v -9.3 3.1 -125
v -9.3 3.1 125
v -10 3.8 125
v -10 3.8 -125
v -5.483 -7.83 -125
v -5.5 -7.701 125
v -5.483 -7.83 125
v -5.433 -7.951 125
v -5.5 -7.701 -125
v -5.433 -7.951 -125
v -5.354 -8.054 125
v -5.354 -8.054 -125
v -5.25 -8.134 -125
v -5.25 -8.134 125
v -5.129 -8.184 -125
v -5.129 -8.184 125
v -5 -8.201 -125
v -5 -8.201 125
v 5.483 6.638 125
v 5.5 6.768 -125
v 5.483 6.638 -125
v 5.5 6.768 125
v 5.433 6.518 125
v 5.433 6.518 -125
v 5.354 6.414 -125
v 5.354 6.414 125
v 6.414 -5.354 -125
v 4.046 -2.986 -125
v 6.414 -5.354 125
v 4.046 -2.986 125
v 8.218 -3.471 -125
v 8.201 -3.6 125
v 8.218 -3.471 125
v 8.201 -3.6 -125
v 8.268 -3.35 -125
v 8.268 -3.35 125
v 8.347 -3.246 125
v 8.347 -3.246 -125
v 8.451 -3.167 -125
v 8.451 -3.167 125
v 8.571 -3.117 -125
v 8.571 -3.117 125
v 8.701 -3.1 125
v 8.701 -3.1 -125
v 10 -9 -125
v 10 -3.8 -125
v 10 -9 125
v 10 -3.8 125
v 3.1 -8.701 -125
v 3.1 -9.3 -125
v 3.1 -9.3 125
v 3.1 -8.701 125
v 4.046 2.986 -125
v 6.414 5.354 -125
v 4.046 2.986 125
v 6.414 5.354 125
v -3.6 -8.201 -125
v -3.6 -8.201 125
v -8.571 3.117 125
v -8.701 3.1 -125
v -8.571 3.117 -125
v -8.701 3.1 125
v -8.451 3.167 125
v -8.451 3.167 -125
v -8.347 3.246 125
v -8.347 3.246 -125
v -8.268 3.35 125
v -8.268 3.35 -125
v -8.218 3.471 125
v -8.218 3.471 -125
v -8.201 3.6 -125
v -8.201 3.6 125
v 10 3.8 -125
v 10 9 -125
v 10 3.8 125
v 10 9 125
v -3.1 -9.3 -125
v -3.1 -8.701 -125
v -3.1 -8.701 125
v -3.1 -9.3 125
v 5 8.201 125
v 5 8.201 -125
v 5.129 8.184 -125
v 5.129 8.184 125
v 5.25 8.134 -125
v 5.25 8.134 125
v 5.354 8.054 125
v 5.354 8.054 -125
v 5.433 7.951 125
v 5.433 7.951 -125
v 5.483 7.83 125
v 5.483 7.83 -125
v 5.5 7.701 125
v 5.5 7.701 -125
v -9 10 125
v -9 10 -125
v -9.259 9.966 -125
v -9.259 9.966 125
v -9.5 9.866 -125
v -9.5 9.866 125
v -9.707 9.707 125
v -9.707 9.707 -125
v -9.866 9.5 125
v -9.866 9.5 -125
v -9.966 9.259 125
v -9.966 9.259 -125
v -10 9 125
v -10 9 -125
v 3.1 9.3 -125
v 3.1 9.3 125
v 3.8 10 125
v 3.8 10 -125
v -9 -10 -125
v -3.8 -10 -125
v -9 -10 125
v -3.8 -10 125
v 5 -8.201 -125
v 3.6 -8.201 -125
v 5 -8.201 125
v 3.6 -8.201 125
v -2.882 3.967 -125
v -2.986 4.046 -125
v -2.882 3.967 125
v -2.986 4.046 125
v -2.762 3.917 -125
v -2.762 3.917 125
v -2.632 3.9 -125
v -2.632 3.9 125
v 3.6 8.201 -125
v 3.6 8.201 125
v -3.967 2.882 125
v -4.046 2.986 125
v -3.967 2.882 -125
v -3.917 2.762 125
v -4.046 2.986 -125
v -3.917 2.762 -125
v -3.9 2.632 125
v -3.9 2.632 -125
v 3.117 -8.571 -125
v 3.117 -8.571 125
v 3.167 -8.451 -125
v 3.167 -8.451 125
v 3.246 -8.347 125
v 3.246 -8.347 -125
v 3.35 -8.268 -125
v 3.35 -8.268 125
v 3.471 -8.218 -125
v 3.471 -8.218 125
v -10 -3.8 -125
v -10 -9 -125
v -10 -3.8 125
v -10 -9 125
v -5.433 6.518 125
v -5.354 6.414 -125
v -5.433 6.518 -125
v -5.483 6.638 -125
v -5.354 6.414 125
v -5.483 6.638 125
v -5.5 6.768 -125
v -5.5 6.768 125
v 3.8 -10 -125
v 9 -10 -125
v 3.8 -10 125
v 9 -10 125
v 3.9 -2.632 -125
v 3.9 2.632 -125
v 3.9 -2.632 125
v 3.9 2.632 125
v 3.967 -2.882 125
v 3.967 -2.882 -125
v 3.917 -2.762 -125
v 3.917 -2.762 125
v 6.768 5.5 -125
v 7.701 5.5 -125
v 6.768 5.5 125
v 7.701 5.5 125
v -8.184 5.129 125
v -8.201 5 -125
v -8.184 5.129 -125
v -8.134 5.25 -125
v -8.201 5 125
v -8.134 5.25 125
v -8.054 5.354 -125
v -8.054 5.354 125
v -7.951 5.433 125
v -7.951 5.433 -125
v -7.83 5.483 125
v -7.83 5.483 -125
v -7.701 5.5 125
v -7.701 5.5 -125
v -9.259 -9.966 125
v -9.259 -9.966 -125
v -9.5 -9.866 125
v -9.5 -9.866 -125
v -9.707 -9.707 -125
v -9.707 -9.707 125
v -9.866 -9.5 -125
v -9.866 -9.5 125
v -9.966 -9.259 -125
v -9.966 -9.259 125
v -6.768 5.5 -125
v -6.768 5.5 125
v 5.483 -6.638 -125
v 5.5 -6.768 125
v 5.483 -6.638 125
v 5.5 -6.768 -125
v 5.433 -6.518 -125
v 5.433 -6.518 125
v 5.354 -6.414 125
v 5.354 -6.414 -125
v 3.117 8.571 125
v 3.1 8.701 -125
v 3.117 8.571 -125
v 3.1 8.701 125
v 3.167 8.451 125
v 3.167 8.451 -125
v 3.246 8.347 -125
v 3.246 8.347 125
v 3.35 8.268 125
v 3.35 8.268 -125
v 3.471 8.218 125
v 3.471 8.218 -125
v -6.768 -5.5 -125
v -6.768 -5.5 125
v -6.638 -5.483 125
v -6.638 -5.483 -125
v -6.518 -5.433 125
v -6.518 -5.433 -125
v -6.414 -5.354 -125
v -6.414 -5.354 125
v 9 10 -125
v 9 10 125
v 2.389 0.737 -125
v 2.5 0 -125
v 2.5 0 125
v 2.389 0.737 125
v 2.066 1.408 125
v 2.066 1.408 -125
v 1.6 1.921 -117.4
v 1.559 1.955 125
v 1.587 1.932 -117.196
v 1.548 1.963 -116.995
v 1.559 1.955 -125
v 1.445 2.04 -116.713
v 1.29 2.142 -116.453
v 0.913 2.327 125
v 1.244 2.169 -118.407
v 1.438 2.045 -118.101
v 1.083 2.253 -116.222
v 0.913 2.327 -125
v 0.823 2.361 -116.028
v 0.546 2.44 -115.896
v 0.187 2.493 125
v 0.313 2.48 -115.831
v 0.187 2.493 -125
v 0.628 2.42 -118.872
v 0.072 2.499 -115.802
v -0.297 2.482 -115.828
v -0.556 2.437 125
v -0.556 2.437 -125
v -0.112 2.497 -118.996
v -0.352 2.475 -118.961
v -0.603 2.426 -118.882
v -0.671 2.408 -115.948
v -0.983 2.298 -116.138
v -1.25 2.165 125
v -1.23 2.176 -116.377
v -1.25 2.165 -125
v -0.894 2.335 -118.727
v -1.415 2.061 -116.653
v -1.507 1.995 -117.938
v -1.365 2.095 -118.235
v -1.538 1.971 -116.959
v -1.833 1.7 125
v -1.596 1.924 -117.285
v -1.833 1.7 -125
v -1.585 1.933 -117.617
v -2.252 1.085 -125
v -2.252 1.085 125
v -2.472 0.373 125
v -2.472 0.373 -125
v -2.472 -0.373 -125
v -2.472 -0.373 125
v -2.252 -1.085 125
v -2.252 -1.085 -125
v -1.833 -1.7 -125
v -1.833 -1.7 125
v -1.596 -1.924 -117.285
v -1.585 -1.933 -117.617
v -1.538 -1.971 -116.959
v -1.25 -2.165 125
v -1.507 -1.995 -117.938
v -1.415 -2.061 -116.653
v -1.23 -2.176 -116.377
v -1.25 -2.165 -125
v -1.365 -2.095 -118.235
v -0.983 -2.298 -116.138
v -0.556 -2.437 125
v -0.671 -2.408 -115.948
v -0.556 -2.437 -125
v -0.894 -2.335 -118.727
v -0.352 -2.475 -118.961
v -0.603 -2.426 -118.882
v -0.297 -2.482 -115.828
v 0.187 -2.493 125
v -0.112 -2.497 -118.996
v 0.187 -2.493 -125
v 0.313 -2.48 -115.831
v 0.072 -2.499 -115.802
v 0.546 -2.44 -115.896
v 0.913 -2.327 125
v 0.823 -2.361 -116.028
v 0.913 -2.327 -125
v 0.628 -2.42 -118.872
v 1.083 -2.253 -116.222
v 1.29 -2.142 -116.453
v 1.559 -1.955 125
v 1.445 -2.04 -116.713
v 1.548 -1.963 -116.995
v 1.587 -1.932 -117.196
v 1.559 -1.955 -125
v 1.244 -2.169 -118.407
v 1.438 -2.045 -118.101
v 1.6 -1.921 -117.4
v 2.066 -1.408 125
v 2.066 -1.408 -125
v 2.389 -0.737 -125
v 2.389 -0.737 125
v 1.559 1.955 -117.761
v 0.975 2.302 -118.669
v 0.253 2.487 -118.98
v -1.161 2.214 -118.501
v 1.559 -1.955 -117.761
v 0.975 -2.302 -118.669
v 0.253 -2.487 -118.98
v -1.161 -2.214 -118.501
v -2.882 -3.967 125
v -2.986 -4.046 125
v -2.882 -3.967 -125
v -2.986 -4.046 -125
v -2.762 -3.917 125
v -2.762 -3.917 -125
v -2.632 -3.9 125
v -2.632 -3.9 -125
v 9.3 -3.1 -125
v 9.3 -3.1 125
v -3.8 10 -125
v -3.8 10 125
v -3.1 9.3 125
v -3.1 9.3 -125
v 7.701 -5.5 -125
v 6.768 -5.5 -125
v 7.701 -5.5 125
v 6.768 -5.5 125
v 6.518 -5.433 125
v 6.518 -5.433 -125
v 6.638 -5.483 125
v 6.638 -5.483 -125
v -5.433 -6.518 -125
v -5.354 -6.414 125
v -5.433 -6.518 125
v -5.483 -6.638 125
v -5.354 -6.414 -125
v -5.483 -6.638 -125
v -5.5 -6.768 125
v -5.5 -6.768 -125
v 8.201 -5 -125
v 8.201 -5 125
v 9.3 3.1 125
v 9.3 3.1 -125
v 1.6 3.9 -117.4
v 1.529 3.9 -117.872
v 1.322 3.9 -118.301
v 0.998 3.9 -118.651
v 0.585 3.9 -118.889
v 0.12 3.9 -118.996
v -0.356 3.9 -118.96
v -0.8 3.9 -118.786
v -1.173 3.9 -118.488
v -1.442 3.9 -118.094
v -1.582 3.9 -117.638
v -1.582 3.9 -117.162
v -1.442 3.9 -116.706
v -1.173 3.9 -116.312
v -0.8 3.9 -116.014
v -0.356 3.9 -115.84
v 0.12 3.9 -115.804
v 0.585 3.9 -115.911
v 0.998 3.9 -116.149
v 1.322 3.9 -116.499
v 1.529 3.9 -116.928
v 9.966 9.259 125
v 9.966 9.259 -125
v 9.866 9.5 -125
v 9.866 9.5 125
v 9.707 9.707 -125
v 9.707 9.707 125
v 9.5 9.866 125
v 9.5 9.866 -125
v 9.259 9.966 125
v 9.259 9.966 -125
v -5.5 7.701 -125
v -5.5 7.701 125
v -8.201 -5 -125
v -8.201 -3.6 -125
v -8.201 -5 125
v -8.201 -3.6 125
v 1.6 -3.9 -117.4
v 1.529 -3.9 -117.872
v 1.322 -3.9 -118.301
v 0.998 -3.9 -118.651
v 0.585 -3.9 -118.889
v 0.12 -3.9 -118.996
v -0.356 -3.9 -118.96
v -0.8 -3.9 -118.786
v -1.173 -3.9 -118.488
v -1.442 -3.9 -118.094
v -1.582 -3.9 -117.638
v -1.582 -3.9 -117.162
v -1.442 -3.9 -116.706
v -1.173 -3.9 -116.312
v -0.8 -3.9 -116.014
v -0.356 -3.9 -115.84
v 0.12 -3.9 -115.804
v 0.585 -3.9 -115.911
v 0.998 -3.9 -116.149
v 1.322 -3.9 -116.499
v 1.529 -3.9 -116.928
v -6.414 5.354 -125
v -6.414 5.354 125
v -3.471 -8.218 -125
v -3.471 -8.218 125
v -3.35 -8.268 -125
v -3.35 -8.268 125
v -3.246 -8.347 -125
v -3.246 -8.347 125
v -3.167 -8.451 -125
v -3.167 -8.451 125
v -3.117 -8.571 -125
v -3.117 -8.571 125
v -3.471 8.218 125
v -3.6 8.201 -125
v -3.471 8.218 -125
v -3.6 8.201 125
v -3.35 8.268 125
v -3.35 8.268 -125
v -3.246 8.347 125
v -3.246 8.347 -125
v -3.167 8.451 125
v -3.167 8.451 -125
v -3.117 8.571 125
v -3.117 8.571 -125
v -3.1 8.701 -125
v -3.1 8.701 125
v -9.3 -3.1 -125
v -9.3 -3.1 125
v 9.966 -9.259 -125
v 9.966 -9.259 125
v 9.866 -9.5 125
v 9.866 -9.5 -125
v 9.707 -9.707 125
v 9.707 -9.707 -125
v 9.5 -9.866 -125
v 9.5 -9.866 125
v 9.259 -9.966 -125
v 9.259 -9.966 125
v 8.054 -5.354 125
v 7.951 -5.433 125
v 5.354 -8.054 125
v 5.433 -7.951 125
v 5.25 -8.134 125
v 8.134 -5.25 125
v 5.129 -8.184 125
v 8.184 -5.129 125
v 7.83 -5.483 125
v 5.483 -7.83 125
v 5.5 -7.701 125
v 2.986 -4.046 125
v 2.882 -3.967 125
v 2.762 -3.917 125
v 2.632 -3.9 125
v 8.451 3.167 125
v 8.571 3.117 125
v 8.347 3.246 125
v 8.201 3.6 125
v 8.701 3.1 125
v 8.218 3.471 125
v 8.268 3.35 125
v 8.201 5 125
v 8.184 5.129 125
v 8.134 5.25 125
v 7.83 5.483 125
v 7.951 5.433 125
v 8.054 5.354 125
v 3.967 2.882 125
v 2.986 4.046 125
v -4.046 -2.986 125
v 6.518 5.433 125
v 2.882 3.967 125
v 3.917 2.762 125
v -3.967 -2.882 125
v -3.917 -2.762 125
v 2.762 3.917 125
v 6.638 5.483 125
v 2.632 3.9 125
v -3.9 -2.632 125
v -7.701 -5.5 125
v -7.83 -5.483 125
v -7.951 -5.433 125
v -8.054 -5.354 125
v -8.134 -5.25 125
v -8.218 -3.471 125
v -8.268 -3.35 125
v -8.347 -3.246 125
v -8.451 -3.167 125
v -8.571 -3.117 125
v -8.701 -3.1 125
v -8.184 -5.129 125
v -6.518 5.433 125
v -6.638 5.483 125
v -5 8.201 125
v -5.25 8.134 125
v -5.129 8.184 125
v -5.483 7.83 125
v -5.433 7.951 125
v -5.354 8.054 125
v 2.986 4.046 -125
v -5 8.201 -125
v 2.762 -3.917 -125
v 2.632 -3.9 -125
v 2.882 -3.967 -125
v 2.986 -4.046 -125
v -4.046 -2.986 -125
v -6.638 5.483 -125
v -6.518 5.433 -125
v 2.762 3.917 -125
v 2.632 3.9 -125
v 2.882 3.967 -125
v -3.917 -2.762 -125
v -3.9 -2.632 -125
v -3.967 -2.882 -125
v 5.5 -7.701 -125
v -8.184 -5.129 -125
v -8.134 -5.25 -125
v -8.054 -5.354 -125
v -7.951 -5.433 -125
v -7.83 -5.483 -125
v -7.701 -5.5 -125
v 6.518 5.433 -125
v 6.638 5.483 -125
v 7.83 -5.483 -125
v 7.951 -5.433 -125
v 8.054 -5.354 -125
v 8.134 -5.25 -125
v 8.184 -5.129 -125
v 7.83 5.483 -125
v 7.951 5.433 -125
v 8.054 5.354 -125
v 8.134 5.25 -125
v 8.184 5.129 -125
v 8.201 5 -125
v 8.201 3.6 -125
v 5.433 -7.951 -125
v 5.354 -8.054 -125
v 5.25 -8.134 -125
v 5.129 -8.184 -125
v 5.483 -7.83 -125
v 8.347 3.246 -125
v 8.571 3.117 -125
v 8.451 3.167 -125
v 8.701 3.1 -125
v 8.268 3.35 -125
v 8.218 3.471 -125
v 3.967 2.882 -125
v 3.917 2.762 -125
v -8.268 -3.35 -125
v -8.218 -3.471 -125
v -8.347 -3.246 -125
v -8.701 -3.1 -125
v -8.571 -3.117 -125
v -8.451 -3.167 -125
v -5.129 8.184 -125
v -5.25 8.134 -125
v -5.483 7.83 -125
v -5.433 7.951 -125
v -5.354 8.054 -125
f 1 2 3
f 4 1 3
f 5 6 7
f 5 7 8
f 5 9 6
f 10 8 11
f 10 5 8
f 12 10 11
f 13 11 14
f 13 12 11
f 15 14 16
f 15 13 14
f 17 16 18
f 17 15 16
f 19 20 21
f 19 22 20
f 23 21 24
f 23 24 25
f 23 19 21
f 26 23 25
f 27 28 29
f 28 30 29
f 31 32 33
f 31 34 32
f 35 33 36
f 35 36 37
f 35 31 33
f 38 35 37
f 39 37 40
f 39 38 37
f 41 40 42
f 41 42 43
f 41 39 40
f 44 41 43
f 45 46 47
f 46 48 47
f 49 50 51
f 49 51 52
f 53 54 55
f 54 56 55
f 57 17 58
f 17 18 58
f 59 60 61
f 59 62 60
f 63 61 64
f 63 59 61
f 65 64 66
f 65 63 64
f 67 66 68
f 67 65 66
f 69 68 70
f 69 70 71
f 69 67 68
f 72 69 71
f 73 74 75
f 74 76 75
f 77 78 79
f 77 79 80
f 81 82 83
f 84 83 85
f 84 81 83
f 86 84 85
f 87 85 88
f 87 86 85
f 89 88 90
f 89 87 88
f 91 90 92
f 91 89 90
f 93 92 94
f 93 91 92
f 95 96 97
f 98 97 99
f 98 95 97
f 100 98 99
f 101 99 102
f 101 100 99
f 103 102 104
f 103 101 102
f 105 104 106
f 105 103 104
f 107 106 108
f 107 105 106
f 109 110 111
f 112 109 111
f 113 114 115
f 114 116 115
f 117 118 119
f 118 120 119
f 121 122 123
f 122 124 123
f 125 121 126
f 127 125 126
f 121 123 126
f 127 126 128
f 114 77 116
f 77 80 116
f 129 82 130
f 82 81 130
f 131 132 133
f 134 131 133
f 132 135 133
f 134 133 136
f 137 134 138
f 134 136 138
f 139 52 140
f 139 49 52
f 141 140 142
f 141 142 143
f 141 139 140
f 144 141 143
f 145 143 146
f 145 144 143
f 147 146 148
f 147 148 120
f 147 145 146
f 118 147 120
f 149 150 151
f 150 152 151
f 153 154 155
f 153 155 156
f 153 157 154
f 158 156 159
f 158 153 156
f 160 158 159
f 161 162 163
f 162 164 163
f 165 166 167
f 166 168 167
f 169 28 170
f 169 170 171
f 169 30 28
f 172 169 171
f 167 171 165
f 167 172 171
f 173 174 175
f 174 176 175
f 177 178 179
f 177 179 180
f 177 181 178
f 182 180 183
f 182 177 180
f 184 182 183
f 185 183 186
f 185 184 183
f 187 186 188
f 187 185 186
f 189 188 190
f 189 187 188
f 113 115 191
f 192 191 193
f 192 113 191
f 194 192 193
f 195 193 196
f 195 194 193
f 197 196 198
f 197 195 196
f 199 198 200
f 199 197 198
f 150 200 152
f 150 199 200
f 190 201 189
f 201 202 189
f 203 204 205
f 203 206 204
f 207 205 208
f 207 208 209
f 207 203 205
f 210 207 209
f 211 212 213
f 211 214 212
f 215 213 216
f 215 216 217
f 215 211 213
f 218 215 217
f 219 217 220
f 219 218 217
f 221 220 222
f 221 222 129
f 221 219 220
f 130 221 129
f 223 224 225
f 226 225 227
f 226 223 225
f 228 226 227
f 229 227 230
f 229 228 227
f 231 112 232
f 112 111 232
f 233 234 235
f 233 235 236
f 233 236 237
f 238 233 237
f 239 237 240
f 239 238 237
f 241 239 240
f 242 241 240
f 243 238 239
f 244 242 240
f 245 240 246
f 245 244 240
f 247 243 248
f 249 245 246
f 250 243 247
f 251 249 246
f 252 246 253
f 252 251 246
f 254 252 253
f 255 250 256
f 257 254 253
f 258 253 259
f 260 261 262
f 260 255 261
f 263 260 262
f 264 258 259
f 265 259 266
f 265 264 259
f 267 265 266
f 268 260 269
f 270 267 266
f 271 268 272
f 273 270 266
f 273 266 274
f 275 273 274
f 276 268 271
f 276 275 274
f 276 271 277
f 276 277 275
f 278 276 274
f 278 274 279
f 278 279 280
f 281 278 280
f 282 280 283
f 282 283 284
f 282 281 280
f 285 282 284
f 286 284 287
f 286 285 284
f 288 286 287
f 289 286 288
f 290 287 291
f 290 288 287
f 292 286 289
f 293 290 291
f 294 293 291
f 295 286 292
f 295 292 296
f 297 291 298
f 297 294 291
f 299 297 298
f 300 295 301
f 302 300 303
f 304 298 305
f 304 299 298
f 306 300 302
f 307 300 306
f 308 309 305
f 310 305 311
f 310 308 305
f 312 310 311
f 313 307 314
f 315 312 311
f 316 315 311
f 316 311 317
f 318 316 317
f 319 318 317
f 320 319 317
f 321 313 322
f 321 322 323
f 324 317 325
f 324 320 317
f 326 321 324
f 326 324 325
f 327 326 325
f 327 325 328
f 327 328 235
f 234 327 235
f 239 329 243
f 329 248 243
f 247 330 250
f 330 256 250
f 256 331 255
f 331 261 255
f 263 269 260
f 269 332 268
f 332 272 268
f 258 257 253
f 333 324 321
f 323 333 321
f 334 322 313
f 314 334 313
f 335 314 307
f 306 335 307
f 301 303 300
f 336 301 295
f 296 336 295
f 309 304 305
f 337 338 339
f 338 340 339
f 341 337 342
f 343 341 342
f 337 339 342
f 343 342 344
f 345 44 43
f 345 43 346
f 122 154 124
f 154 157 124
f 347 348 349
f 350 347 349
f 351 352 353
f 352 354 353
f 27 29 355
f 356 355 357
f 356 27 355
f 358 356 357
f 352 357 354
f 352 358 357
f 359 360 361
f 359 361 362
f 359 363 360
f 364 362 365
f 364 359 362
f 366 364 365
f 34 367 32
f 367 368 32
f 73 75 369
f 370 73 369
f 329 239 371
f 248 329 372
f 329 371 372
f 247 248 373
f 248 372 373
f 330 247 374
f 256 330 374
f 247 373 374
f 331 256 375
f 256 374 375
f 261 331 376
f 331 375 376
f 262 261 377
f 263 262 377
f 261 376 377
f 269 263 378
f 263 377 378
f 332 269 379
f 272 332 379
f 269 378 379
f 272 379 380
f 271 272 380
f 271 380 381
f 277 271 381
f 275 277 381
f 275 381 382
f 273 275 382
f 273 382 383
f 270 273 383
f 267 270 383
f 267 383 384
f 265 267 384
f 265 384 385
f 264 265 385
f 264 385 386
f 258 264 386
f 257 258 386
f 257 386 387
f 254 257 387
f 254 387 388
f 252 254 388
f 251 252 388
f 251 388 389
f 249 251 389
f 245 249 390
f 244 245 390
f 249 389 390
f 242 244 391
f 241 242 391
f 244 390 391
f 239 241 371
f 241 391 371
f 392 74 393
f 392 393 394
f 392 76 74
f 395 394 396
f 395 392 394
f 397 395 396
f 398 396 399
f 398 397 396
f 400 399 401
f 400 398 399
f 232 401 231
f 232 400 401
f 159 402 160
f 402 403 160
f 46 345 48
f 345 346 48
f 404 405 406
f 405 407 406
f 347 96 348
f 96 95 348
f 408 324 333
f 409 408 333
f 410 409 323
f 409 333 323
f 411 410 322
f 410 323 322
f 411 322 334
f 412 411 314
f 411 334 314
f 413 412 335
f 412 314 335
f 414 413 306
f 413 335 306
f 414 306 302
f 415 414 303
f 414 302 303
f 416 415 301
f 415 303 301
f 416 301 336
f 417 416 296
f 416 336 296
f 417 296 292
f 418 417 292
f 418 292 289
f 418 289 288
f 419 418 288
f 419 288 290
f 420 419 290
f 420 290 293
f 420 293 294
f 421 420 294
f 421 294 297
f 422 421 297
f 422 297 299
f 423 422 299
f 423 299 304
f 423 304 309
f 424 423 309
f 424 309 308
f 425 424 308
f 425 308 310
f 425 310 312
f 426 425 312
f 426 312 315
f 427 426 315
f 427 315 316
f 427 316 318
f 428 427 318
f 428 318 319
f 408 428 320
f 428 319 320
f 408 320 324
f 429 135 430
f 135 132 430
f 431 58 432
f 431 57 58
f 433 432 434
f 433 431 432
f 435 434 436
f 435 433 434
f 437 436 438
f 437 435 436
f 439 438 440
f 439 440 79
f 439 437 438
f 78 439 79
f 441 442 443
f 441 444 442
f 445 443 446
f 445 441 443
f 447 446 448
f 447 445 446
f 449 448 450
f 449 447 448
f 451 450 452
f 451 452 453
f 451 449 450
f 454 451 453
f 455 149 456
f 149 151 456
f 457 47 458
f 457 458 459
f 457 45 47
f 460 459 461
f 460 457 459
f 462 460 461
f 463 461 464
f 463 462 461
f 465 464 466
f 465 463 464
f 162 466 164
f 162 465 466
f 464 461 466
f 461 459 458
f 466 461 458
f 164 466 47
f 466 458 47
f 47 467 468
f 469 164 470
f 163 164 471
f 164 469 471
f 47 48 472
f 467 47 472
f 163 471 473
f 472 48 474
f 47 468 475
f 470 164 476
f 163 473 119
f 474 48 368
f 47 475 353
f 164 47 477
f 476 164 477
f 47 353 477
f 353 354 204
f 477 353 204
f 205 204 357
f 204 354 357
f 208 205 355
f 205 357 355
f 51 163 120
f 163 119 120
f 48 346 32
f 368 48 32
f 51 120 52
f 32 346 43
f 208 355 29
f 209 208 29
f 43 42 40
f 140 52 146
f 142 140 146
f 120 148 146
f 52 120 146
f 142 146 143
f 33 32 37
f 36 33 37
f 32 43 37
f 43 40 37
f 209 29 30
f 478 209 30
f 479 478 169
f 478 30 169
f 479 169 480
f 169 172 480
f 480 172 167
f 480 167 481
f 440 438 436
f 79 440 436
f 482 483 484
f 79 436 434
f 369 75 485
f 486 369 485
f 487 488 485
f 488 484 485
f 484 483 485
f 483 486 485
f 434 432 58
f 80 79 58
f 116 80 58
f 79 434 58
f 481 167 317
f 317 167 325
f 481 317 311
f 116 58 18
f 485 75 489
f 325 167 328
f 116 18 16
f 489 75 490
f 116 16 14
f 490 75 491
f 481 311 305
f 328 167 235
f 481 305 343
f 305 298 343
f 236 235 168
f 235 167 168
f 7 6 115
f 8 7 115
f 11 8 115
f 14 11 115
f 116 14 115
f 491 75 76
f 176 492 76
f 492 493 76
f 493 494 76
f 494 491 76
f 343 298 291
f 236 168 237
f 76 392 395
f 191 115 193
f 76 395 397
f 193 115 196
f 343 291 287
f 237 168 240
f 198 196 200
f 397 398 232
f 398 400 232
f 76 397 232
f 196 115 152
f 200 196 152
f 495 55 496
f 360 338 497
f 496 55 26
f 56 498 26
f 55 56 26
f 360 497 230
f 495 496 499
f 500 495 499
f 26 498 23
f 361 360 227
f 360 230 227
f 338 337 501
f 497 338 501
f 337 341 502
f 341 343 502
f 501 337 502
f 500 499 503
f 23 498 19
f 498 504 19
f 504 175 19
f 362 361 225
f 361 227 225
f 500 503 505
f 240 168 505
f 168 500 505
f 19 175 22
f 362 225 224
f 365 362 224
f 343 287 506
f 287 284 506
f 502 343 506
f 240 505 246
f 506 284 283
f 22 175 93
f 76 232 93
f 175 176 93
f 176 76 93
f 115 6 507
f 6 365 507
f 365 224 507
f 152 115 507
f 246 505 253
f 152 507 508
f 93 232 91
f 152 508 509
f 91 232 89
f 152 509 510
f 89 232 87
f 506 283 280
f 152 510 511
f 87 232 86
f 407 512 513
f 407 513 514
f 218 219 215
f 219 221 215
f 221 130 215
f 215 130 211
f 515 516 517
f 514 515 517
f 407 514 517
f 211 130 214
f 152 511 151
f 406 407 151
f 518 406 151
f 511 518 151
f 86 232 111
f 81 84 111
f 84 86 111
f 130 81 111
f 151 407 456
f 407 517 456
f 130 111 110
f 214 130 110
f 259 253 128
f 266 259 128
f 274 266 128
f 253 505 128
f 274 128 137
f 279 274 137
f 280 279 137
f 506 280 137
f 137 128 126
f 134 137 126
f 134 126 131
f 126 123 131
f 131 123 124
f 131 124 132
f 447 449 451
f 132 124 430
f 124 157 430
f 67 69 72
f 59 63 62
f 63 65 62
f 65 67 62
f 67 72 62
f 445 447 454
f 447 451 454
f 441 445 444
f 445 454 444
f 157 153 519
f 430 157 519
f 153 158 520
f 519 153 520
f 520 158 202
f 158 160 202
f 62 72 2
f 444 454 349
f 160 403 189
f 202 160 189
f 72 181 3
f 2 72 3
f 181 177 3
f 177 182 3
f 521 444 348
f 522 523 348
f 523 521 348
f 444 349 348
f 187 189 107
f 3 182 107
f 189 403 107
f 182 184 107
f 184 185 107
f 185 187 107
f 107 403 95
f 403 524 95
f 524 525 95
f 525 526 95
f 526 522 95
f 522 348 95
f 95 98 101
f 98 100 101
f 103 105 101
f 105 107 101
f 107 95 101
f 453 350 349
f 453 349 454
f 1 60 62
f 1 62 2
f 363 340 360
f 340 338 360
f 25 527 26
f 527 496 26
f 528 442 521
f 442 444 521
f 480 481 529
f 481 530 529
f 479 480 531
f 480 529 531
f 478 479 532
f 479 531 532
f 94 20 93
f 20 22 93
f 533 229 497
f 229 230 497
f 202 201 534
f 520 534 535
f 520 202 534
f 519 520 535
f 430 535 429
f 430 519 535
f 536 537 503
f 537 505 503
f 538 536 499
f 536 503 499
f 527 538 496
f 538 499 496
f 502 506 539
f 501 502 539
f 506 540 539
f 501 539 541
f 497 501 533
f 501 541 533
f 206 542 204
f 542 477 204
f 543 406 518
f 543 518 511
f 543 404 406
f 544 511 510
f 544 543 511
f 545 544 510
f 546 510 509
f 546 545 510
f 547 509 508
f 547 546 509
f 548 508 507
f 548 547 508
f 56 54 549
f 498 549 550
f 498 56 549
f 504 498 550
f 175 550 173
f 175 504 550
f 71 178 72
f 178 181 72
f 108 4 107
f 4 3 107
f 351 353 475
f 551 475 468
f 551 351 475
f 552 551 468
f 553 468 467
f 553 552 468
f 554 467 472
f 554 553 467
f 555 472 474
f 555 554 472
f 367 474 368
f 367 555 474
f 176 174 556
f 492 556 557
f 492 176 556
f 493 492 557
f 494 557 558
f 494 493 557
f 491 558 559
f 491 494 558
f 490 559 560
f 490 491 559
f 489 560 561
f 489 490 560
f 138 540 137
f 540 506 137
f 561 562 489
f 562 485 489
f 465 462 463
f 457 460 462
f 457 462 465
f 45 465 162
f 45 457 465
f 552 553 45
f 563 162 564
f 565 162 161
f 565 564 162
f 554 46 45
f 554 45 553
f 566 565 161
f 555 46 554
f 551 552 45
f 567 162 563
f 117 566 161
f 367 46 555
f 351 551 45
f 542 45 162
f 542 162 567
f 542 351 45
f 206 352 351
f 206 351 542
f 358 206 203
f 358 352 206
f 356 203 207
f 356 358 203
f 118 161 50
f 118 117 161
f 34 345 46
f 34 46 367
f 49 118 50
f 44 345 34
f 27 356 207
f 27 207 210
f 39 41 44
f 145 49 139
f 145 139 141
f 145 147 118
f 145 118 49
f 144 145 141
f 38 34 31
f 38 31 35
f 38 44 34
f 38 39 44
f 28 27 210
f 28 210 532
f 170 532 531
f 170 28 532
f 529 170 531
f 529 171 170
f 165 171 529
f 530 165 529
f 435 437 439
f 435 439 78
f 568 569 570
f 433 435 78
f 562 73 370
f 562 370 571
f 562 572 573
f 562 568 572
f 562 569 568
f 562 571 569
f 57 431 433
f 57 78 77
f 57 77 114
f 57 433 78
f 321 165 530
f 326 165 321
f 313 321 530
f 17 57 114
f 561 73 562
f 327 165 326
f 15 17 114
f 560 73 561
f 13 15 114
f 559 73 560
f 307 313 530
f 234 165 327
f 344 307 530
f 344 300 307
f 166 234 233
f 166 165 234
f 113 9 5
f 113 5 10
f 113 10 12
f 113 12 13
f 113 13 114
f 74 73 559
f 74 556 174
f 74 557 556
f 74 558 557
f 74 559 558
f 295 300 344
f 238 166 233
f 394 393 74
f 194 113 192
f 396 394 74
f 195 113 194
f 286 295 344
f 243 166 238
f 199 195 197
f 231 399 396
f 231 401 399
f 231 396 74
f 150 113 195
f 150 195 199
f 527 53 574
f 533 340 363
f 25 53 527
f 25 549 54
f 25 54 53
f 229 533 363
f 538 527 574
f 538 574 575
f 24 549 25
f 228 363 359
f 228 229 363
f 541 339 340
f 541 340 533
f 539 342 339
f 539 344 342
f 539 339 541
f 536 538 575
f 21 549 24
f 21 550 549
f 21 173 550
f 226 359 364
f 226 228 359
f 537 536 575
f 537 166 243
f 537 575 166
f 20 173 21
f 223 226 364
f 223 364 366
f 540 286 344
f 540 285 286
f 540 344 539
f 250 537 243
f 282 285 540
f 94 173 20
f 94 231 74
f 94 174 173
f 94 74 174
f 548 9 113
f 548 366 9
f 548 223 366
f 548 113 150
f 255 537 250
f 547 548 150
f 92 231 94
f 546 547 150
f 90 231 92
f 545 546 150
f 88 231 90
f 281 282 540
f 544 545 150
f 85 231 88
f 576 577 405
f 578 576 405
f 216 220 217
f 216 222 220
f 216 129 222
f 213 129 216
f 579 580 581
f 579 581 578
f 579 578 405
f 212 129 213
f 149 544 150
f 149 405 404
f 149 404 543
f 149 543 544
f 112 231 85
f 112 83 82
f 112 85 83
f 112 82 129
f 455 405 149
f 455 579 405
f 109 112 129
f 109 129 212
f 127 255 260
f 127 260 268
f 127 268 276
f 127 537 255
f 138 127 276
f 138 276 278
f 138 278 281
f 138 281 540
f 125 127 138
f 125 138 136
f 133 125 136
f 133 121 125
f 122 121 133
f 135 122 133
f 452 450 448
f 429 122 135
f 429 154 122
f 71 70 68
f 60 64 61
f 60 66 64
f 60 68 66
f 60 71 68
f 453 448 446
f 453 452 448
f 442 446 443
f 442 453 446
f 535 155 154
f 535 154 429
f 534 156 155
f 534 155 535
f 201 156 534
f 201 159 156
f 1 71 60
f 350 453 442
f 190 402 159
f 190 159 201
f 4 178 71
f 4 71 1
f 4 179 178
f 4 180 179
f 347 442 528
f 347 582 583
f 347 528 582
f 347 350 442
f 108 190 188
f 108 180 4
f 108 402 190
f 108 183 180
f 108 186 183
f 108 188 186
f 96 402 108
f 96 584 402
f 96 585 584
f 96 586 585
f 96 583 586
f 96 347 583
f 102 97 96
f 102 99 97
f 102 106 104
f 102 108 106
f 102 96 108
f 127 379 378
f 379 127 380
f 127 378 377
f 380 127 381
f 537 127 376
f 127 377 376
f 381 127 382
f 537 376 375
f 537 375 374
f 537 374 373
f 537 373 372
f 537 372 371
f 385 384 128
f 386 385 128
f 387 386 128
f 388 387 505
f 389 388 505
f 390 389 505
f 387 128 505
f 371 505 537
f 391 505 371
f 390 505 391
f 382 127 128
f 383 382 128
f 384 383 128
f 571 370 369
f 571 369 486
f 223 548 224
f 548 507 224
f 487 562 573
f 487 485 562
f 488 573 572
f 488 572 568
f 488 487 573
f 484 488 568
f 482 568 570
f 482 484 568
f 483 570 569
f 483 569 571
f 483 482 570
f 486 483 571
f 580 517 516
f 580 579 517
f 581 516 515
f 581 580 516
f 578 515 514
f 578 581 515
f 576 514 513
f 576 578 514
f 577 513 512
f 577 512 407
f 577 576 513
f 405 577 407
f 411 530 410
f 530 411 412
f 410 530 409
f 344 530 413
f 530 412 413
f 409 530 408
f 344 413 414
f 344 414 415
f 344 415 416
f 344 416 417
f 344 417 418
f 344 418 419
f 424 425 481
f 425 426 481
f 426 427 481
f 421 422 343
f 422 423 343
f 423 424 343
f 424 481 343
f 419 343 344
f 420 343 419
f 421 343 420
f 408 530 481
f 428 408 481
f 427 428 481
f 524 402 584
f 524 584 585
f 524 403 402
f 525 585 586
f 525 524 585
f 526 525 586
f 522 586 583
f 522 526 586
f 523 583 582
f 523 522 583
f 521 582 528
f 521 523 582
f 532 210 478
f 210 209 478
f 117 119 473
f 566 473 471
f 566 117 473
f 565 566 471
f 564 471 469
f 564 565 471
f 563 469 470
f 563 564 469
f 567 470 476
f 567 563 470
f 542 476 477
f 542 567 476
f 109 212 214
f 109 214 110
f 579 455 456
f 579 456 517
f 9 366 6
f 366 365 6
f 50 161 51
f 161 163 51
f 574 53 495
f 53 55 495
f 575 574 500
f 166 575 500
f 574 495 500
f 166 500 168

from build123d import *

# Parameters (mm, degrees)
SKETCH1_R           = 2.5
BOSS_EXTRUDE1_DEPTH = 125
FILLET1_R           = 0.5
FILLET2_R           = 0.5
FILLET3_R           = 1
SKETCH2_R           = 1.6
CUT_EXTRUDE1_DEPTH  = 14.9


with BuildPart() as part:
    # Sketch1 → Boss-Extrude1 (new body, symmetric)
    with BuildSketch(Plane.XY):
        Polygon((3.9, -2.839339828), (6.560660172, -5.5), (8.200660172, -5.5), (8.200660172, -3.1), (9.3, -3.1), (10, -3.8), (10, -10), (3.8, -10), (3.1, -9.3), (3.1, -8.200660172), (5.5, -8.200660172), (5.5, -6.560660172), (2.839339828, -3.9), (-2.839339828, -3.9), (-5.5, -6.560660172), (-5.5, -8.200660172), (-3.1, -8.200660172), (-3.1, -9.3), (-3.8, -10), (-10, -10), (-10, -3.8), (-9.3, -3.1), (-8.200660172, -3.1), (-8.200660172, -5.5), (-6.560660172, -5.5), (-3.9, -2.839339828), (-3.9, 2.839339828), (-6.560660172, 5.5), (-8.200660172, 5.5), (-8.200660172, 3.1), (-9.3, 3.1), (-10, 3.8), (-10, 10), (-3.8, 10), (-3.1, 9.3), (-3.1, 8.200660172), (-5.5, 8.200660172), (-5.5, 6.560660172), (-2.839339828, 3.9), (2.839339828, 3.9), (5.5, 6.560660172), (5.5, 8.200660172), (3.1, 8.200660172), (3.1, 9.3), (3.8, 10), (10, 10), (10, 3.8), (9.3, 3.1), (8.200660172, 3.1), (8.200660172, 5.5), (6.560660172, 5.5), (3.9, 2.839339828), align=None)
        Circle(SKETCH1_R, mode=Mode.SUBTRACT)
    extrude(amount=BOSS_EXTRUDE1_DEPTH, both=True)

    # Fillet1
    fillet1_edges = [part.edges().sort_by_distance(p)[0] for p in [
        (-2.839339828, 3.9, 0),
        (2.839339828, 3.9, 0),
        (3.9, 2.839339828, 0),
        (3.9, -2.839339828, 0),
        (2.839339828, -3.9, 0),
        (-2.839339828, -3.9, 0),
        (-3.9, -2.839339828, 0),
        (-3.9, 2.839339828, 0),
    ]]
    fillet(fillet1_edges, radius=FILLET1_R)

    # Fillet2
    fillet2_edges = [part.edges().sort_by_distance(p)[0] for p in [
        (-5.5, 6.560660172, 0),
        (5.5, 6.560660172, 0),
        (5.5, 8.200660172, 0),
        (3.1, 8.200660172, 0),
        (8.200660172, 3.1, 0),
        (8.200660172, 5.5, 0),
        (6.560660172, 5.5, 0),
        (6.560660172, -5.5, 0),
        (8.200660172, -5.5, 0),
        (8.200660172, -3.1, 0),
        (3.1, -8.200660172, 0),
        (5.5, -8.200660172, 0),
        (5.5, -6.560660172, 0),
        (-5.5, -6.560660172, 0),
        (-5.5, -8.200660172, 0),
        (-3.1, -8.200660172, 0),
        (-8.200660172, -3.1, 0),
        (-8.200660172, -5.5, 0),
        (-6.560660172, -5.5, 0),
        (-6.560660172, 5.5, 0),
        (-8.200660172, 5.5, 0),
        (-8.200660172, 3.1, 0),
        (-3.1, 8.200660172, 0),
        (-5.5, 8.200660172, 0),
    ]]
    fillet(fillet2_edges, radius=FILLET2_R)

    # Fillet3
    fillet3_edges = [part.edges().sort_by_distance(p)[0] for p in [
        (10, 10, 0),
        (10, -10, 0),
        (-10, -10, 0),
        (-10, 10, 0),
    ]]
    fillet(fillet3_edges, radius=FILLET3_R)

    # Sketch2 → Cut-Extrude1 (cut, through all)
    with BuildSketch(Plane(origin=(0, 3.9, 0), x_dir=(1, 0, 0), z_dir=(0, 1, 0))):
        with Locations((0, 117.4)):
            Circle(SKETCH2_R)
    extrude(amount=-CUT_EXTRUDE1_DEPTH, mode=Mode.SUBTRACT)


solid = part.part
